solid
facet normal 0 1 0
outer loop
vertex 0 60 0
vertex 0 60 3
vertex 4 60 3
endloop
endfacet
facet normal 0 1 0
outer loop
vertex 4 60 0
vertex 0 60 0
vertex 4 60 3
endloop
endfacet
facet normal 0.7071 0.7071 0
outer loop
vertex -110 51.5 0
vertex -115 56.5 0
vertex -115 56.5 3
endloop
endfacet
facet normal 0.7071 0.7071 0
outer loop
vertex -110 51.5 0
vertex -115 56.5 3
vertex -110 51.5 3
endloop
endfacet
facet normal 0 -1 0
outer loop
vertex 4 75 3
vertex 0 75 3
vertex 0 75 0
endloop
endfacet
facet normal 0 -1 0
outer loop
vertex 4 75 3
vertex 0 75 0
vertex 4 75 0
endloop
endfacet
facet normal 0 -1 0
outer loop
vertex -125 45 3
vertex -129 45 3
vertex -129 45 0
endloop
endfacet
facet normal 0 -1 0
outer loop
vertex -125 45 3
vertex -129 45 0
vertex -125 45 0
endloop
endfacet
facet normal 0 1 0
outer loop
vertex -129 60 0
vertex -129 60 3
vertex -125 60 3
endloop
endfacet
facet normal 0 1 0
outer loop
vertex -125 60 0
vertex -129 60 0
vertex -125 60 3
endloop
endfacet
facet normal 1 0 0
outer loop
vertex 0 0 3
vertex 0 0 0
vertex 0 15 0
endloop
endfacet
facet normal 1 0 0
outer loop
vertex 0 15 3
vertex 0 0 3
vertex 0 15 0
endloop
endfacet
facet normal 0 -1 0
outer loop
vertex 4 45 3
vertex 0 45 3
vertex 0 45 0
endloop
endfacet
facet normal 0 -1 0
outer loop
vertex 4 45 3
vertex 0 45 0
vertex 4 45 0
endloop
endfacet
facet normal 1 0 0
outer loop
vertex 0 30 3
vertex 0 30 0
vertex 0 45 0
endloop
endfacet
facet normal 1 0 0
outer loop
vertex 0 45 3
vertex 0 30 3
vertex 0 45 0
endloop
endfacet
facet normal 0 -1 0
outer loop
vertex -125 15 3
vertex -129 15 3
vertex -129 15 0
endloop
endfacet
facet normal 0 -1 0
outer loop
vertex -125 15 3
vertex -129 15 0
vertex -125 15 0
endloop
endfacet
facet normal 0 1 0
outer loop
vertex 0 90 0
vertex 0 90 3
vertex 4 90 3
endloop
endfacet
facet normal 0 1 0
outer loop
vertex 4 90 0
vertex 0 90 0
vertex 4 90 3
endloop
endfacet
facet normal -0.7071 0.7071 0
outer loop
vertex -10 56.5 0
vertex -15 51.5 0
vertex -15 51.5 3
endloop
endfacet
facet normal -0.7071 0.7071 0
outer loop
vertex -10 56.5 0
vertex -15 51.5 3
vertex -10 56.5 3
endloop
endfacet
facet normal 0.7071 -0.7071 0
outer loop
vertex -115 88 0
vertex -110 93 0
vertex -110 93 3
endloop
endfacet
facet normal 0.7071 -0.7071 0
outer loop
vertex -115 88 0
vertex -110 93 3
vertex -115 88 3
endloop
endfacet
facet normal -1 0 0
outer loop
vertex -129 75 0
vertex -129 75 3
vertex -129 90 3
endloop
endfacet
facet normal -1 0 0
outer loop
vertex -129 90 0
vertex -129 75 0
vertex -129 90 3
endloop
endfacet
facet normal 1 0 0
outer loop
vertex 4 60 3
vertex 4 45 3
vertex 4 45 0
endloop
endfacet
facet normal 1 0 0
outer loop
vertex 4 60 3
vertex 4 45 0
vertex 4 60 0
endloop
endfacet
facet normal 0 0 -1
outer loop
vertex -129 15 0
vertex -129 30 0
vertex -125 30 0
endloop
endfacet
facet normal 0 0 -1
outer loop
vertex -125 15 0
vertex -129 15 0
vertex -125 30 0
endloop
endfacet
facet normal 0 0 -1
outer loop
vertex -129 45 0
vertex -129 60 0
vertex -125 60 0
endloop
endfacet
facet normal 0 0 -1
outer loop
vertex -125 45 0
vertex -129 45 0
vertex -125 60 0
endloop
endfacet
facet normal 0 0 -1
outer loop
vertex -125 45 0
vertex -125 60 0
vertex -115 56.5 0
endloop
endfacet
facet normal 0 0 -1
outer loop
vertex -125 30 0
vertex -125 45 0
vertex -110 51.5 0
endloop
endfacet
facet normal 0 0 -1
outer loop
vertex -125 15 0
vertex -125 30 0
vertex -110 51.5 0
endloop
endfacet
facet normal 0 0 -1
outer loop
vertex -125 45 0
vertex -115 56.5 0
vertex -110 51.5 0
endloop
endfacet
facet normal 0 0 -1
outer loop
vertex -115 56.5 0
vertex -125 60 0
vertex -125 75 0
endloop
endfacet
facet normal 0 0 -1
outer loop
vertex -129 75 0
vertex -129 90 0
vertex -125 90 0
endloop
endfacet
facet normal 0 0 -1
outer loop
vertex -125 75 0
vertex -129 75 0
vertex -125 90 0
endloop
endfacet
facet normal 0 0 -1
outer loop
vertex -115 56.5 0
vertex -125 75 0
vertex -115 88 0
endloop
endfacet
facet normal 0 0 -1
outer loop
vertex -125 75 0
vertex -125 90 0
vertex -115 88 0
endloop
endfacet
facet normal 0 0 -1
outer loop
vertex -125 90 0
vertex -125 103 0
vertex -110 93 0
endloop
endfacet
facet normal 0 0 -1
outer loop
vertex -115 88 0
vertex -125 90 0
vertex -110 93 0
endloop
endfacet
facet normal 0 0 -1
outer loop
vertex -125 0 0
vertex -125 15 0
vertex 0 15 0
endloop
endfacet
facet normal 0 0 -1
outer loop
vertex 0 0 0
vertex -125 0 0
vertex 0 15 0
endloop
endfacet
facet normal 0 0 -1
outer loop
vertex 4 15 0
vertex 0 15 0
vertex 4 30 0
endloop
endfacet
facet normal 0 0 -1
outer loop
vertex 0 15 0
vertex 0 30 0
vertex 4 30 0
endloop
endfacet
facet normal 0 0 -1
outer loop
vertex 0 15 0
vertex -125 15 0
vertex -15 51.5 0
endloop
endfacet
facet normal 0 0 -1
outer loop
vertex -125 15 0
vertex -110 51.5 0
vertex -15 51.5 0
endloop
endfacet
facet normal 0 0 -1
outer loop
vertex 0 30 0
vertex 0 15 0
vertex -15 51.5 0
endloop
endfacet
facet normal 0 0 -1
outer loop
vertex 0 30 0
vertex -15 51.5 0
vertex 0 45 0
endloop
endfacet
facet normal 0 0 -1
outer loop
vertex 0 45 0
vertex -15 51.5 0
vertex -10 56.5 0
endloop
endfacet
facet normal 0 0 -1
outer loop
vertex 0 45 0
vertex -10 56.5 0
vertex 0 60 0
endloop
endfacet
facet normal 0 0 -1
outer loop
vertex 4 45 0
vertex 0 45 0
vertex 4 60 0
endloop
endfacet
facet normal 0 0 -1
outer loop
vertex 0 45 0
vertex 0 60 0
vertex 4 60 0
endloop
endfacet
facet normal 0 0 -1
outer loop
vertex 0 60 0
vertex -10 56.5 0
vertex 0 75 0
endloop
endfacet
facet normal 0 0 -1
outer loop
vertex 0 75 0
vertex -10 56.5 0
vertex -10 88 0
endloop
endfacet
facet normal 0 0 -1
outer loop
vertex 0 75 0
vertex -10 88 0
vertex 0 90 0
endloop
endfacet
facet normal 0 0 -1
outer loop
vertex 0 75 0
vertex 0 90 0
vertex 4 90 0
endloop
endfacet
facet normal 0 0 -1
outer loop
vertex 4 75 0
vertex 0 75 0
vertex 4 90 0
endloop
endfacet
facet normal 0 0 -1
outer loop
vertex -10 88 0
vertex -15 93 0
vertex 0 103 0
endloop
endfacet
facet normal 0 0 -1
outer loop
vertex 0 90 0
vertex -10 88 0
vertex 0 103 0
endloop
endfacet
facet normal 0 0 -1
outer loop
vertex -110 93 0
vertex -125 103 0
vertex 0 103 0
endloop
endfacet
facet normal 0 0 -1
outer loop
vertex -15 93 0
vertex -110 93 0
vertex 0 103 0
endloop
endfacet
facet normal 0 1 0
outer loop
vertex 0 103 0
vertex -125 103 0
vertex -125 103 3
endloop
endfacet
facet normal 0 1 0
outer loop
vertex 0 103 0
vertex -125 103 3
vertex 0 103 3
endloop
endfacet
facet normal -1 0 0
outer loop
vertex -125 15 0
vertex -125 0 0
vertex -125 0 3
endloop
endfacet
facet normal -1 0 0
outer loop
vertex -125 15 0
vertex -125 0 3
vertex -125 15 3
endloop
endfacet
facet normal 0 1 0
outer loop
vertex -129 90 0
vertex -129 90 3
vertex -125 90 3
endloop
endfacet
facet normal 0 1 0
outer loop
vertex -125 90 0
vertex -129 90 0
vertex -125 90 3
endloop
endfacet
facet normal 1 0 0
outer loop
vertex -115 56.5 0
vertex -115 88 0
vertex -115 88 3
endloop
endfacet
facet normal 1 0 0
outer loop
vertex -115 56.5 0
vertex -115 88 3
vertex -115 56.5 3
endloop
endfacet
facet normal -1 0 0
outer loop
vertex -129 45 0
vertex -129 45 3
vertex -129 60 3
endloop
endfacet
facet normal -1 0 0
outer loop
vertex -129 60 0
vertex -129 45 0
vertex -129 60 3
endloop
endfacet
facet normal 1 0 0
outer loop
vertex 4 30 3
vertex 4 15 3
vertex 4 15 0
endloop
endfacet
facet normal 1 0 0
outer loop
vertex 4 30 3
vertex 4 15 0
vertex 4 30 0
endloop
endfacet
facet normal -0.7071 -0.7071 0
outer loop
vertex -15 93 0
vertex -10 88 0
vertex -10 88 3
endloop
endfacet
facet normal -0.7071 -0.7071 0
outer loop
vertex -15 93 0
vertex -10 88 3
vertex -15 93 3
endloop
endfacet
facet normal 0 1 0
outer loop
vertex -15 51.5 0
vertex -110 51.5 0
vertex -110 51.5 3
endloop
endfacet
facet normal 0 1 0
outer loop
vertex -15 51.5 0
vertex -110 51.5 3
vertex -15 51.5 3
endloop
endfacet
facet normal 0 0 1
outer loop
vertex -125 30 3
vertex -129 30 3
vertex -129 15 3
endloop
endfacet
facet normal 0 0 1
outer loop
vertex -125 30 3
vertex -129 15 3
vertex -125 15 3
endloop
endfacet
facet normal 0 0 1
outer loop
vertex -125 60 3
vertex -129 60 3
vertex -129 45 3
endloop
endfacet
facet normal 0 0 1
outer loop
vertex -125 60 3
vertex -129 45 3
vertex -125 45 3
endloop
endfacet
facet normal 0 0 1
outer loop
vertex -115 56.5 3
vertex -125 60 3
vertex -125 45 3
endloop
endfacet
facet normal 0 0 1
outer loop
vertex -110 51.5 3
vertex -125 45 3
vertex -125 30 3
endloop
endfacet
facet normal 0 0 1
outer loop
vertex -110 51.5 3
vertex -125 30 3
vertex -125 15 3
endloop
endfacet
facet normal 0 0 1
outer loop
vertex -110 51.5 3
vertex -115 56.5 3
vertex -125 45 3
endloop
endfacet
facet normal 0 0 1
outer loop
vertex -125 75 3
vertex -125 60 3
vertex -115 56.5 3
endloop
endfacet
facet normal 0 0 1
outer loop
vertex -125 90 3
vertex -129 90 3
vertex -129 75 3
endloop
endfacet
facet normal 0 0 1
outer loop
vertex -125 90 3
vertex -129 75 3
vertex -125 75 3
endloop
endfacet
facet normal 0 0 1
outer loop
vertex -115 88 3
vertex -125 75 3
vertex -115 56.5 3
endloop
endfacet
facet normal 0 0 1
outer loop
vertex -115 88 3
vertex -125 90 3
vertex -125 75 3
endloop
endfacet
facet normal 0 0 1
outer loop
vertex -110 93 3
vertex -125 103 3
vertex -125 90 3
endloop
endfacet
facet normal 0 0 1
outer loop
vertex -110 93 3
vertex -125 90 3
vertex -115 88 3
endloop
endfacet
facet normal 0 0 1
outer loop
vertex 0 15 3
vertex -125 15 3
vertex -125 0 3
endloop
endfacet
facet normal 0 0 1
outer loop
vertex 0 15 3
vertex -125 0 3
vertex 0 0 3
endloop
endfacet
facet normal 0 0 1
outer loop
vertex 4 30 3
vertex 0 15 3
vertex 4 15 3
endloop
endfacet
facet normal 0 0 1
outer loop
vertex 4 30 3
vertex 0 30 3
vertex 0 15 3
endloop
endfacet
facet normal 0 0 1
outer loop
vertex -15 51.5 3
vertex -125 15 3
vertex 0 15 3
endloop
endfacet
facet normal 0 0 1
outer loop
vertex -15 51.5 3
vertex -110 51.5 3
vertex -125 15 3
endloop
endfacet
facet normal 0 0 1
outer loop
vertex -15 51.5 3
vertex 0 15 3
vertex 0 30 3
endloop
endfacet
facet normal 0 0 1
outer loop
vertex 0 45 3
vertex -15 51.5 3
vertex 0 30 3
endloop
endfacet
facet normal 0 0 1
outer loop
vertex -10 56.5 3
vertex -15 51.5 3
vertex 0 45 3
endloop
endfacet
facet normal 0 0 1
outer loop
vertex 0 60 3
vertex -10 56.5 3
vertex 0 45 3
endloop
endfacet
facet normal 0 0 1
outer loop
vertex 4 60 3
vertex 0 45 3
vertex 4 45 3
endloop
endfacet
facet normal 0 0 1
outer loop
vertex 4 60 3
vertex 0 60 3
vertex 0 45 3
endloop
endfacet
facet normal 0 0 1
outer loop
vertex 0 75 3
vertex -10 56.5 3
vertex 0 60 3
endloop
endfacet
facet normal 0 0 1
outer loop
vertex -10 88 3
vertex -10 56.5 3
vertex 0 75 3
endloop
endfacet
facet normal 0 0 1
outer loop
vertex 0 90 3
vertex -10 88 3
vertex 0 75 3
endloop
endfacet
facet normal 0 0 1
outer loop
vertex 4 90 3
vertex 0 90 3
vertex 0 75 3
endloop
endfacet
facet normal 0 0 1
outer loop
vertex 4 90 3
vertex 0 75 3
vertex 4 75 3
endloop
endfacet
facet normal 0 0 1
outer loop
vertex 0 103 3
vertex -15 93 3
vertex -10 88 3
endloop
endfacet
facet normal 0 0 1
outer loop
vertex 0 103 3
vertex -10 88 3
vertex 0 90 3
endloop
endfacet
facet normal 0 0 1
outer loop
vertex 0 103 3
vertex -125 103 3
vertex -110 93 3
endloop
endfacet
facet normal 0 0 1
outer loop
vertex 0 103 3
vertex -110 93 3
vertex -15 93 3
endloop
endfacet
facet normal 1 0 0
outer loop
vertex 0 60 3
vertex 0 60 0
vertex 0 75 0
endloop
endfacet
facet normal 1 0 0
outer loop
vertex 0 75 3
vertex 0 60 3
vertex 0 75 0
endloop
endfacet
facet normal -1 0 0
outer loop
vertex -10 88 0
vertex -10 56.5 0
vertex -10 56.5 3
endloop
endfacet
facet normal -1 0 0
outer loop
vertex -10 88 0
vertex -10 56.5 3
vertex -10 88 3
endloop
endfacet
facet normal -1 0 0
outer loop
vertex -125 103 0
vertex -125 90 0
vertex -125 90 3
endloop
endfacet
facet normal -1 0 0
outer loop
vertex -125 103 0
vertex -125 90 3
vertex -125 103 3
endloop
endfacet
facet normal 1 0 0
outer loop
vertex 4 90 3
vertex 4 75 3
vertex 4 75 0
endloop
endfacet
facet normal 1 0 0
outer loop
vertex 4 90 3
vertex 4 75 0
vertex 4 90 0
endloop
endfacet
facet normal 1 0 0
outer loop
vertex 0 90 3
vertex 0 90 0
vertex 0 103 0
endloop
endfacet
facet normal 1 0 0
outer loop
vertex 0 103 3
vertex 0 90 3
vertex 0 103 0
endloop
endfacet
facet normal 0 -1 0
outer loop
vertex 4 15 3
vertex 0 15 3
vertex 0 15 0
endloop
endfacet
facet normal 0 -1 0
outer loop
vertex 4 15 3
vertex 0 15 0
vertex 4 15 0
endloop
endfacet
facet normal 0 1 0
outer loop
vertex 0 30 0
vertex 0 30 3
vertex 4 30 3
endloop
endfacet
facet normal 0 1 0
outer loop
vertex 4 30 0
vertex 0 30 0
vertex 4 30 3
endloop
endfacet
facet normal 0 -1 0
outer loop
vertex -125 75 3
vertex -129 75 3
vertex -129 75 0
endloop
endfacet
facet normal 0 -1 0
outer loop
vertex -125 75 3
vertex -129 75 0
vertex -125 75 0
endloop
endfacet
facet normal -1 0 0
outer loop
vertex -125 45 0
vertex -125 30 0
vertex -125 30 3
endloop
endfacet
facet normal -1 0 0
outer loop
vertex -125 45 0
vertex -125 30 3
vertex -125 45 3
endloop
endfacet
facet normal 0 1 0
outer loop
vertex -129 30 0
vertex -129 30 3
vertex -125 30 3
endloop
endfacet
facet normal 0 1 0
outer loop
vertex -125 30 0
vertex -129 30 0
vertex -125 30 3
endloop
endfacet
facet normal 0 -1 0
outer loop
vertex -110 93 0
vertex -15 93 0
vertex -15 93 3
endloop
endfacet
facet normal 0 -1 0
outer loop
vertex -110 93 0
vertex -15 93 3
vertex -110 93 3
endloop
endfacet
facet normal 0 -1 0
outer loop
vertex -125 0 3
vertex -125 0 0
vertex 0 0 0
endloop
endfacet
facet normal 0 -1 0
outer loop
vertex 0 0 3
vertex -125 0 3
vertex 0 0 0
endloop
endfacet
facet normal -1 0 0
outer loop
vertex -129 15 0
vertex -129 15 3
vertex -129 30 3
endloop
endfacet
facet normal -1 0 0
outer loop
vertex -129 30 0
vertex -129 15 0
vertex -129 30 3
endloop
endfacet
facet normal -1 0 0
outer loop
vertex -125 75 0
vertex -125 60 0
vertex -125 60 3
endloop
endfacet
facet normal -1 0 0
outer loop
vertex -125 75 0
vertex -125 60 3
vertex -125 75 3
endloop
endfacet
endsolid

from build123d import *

# Parameters (mm, degrees)
SKETCH1_W           = 125
SKETCH1_H           = 103
BOSS_EXTRUDE1_DEPTH = 3
SKETCH2_W           = 4
SKETCH2_H           = 15
BOSS_EXTRUDE2_DEPTH = 3


with BuildPart() as part:
    # Sketch1 → Boss-Extrude1 (new body)
    with BuildSketch(Plane.XY):
        with Locations((-62.5, 51.5)):
            Rectangle(SKETCH1_W, SKETCH1_H)
        Polygon((-15, 93), (-110, 93), (-115, 88), (-115, 56.5), (-110, 51.5), (-15, 51.5), (-10, 56.5), (-10, 88), align=None, mode=Mode.SUBTRACT)
    extrude(amount=BOSS_EXTRUDE1_DEPTH)

    # Sketch2 → Boss-Extrude2 (add)
    with BuildSketch(Plane.XY.offset(3)):
        with Locations((2, 82.5)):
            Rectangle(SKETCH2_W, SKETCH2_H)
        with Locations((2, 22.5)):
            Rectangle(SKETCH2_W, SKETCH2_H)
        with Locations((-127, 22.5)):
            Rectangle(SKETCH2_W, SKETCH2_H)
        with Locations((2, 52.5)):
            Rectangle(SKETCH2_W, SKETCH2_H)
        with Locations((-127, 52.5)):
            Rectangle(SKETCH2_W, SKETCH2_H)
        with Locations((-127, 82.5)):
            Rectangle(SKETCH2_W, SKETCH2_H)
    extrude(amount=-BOSS_EXTRUDE2_DEPTH)


solid = part.part
